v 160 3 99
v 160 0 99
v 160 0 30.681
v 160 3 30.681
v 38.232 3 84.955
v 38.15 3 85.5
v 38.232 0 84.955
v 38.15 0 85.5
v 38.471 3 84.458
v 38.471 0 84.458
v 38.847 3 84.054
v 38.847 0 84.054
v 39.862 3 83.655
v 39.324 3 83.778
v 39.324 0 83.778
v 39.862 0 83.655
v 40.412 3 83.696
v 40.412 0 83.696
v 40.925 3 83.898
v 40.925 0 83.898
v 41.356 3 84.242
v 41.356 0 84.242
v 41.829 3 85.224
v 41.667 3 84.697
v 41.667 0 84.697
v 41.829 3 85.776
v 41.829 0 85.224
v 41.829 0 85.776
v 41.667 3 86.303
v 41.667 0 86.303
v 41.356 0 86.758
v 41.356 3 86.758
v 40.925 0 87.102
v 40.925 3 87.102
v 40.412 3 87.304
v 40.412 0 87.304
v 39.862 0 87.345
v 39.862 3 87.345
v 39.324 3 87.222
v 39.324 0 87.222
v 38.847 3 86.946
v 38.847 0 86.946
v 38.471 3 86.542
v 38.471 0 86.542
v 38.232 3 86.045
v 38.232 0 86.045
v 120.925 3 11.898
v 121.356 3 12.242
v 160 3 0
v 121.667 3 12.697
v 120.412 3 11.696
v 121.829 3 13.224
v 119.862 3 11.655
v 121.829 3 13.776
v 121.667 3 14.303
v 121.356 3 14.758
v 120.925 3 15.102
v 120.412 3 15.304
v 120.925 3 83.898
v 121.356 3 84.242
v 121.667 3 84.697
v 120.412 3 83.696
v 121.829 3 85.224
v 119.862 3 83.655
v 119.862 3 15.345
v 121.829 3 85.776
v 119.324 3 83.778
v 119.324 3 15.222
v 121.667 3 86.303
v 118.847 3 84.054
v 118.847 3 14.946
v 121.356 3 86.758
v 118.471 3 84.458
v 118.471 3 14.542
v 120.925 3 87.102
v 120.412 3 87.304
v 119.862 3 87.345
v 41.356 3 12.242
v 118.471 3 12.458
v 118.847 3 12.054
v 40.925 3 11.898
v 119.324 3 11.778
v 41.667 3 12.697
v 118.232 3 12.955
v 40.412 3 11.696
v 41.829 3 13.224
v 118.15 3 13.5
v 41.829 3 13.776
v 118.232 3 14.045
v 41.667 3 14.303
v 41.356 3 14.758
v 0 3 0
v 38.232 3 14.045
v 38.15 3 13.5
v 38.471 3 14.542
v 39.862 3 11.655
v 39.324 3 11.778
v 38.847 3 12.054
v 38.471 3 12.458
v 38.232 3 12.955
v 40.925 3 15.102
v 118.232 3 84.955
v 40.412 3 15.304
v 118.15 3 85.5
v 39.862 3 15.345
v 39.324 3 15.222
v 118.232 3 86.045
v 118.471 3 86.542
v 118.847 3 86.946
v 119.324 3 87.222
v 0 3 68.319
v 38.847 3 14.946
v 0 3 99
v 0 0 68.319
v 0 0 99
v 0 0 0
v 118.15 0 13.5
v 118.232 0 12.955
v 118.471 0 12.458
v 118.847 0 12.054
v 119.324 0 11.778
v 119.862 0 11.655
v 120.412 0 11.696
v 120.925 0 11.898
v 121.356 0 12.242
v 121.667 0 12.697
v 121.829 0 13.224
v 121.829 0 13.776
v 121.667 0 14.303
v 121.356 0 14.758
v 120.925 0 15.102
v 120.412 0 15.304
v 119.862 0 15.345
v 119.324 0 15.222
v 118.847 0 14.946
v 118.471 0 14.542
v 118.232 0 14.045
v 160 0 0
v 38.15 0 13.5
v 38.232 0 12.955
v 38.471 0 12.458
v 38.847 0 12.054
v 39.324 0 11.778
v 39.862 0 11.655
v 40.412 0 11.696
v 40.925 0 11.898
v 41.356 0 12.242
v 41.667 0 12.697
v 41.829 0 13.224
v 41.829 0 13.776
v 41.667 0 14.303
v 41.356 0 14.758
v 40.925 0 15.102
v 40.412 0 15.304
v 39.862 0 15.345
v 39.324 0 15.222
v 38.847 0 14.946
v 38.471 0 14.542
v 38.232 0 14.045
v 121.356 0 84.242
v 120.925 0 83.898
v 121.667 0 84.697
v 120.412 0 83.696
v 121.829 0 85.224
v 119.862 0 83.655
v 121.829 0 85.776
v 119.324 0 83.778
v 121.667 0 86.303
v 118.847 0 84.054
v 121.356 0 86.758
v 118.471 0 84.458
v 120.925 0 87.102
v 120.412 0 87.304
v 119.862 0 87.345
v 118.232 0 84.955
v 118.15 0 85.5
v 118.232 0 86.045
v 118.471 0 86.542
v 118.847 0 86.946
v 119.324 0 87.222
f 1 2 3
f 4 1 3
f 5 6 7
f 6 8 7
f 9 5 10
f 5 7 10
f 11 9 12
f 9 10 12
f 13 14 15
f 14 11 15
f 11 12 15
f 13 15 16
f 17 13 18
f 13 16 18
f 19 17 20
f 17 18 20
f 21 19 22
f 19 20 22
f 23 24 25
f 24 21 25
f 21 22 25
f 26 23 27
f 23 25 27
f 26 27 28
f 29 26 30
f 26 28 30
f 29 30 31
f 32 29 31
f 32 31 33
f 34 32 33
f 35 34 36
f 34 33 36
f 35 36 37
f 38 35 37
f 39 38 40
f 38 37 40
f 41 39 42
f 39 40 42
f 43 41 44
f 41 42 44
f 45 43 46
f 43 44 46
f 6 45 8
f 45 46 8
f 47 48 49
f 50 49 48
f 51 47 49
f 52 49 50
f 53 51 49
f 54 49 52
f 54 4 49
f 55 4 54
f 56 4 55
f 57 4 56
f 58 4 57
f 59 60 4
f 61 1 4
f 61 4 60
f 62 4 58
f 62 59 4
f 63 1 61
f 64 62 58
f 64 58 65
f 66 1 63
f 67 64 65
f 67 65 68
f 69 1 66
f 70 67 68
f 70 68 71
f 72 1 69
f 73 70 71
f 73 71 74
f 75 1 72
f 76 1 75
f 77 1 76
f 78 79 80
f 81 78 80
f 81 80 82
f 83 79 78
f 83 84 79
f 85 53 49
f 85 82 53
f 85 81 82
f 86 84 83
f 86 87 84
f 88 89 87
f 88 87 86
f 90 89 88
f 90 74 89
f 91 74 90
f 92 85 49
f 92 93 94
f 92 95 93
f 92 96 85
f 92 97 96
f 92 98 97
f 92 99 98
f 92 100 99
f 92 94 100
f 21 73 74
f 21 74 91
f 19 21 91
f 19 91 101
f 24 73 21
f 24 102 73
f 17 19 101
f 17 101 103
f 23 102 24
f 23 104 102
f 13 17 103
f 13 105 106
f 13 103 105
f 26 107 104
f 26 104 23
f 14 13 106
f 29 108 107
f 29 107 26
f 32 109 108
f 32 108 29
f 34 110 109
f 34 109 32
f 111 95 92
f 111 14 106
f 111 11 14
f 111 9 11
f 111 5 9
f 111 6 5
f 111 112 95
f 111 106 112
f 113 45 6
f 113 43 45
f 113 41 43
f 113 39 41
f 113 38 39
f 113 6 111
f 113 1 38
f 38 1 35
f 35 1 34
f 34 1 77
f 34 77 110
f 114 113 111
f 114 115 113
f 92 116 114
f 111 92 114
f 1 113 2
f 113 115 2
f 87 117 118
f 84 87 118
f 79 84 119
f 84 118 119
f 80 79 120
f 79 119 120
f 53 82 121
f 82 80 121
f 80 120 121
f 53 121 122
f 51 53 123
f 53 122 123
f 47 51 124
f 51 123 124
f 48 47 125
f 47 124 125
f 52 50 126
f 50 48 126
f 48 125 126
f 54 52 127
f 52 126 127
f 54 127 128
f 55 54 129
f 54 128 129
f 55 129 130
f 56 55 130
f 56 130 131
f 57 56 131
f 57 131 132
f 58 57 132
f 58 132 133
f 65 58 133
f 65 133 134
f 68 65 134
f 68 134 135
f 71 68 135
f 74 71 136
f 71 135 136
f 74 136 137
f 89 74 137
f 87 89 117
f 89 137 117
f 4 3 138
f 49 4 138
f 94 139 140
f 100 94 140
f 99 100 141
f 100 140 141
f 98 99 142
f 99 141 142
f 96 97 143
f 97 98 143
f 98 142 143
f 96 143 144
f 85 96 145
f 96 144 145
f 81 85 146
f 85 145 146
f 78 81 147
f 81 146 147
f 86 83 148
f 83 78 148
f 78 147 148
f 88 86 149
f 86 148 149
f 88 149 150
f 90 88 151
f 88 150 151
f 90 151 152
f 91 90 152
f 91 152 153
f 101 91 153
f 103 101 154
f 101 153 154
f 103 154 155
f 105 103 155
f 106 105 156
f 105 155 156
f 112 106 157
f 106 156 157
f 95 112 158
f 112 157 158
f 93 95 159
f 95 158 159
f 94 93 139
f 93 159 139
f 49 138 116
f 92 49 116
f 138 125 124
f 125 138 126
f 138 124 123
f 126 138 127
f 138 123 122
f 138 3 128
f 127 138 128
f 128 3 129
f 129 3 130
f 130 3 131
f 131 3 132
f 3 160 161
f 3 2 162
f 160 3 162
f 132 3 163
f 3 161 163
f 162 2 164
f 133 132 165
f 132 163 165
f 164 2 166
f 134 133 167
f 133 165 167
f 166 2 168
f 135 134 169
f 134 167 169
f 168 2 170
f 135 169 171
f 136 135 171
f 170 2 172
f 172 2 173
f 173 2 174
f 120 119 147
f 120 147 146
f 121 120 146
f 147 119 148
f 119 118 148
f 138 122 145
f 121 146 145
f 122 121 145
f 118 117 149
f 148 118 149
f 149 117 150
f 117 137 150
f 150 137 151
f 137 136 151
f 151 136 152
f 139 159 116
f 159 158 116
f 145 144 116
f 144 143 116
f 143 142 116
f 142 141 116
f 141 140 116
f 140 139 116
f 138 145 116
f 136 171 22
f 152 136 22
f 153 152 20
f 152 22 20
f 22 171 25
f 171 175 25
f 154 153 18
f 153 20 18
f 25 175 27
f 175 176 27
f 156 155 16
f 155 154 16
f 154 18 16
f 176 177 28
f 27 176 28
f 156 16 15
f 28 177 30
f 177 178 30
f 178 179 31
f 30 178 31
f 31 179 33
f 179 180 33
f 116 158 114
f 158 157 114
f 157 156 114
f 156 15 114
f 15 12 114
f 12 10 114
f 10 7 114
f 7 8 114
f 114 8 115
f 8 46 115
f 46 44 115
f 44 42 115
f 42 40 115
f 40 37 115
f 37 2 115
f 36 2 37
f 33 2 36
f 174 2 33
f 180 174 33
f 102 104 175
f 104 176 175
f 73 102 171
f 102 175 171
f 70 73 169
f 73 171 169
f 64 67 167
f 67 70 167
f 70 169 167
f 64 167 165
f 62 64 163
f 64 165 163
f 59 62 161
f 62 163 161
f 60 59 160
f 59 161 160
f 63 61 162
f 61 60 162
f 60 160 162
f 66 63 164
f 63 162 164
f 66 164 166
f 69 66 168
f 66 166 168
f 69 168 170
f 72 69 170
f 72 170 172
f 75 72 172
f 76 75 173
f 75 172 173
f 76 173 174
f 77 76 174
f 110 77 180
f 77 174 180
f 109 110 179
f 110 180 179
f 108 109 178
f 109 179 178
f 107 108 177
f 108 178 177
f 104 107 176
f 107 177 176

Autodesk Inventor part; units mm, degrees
ref_plane "YZ Plane" through (0, 0, 0) normal (1, 0, 0) x (0, 1, 0)
ref_plane "XZ Plane" through (0, 0, 0) normal (0, 1, 0) x (-1, 0, 0)
ref_plane "XY Plane" through (0, 0, 0) normal (0, 0, 1) x (1, 0, 0)
sketch "Эскиз1" plane through (0, 0, 0) normal (0, 1, 0) x (-1, 0, 0)
  circle A0 centre (-40, 85.5) radius 1.85
  circle A1 centre (-40, 13.5) radius 1.85
  circle A2 centre (-120, 85.5) radius 1.85
  circle A3 centre (-120, 13.5) radius 1.85
  line L0 (0, 99) -> (0, 68.3189)
  line L1 (0, 99) -> (-160, 99)
  line L2 (-160, 0) -> (0, 0)
  line L3 (-160, 30.6811) -> (-160, 0)
  line L4 (0, 99) -> (-160, 99)
  line L5 (-160, 99) -> (-160, 0)
  line L6 (-160, 0) -> (0, 0)
  line L7 (0, 0) -> (0, 99)
extrude "Выдавливание1" add sketch "Эскиз1" along normal blind 3
properties part number "KB33-046-004-001 - Центральная пластина" material "Дерево (вишня)"
